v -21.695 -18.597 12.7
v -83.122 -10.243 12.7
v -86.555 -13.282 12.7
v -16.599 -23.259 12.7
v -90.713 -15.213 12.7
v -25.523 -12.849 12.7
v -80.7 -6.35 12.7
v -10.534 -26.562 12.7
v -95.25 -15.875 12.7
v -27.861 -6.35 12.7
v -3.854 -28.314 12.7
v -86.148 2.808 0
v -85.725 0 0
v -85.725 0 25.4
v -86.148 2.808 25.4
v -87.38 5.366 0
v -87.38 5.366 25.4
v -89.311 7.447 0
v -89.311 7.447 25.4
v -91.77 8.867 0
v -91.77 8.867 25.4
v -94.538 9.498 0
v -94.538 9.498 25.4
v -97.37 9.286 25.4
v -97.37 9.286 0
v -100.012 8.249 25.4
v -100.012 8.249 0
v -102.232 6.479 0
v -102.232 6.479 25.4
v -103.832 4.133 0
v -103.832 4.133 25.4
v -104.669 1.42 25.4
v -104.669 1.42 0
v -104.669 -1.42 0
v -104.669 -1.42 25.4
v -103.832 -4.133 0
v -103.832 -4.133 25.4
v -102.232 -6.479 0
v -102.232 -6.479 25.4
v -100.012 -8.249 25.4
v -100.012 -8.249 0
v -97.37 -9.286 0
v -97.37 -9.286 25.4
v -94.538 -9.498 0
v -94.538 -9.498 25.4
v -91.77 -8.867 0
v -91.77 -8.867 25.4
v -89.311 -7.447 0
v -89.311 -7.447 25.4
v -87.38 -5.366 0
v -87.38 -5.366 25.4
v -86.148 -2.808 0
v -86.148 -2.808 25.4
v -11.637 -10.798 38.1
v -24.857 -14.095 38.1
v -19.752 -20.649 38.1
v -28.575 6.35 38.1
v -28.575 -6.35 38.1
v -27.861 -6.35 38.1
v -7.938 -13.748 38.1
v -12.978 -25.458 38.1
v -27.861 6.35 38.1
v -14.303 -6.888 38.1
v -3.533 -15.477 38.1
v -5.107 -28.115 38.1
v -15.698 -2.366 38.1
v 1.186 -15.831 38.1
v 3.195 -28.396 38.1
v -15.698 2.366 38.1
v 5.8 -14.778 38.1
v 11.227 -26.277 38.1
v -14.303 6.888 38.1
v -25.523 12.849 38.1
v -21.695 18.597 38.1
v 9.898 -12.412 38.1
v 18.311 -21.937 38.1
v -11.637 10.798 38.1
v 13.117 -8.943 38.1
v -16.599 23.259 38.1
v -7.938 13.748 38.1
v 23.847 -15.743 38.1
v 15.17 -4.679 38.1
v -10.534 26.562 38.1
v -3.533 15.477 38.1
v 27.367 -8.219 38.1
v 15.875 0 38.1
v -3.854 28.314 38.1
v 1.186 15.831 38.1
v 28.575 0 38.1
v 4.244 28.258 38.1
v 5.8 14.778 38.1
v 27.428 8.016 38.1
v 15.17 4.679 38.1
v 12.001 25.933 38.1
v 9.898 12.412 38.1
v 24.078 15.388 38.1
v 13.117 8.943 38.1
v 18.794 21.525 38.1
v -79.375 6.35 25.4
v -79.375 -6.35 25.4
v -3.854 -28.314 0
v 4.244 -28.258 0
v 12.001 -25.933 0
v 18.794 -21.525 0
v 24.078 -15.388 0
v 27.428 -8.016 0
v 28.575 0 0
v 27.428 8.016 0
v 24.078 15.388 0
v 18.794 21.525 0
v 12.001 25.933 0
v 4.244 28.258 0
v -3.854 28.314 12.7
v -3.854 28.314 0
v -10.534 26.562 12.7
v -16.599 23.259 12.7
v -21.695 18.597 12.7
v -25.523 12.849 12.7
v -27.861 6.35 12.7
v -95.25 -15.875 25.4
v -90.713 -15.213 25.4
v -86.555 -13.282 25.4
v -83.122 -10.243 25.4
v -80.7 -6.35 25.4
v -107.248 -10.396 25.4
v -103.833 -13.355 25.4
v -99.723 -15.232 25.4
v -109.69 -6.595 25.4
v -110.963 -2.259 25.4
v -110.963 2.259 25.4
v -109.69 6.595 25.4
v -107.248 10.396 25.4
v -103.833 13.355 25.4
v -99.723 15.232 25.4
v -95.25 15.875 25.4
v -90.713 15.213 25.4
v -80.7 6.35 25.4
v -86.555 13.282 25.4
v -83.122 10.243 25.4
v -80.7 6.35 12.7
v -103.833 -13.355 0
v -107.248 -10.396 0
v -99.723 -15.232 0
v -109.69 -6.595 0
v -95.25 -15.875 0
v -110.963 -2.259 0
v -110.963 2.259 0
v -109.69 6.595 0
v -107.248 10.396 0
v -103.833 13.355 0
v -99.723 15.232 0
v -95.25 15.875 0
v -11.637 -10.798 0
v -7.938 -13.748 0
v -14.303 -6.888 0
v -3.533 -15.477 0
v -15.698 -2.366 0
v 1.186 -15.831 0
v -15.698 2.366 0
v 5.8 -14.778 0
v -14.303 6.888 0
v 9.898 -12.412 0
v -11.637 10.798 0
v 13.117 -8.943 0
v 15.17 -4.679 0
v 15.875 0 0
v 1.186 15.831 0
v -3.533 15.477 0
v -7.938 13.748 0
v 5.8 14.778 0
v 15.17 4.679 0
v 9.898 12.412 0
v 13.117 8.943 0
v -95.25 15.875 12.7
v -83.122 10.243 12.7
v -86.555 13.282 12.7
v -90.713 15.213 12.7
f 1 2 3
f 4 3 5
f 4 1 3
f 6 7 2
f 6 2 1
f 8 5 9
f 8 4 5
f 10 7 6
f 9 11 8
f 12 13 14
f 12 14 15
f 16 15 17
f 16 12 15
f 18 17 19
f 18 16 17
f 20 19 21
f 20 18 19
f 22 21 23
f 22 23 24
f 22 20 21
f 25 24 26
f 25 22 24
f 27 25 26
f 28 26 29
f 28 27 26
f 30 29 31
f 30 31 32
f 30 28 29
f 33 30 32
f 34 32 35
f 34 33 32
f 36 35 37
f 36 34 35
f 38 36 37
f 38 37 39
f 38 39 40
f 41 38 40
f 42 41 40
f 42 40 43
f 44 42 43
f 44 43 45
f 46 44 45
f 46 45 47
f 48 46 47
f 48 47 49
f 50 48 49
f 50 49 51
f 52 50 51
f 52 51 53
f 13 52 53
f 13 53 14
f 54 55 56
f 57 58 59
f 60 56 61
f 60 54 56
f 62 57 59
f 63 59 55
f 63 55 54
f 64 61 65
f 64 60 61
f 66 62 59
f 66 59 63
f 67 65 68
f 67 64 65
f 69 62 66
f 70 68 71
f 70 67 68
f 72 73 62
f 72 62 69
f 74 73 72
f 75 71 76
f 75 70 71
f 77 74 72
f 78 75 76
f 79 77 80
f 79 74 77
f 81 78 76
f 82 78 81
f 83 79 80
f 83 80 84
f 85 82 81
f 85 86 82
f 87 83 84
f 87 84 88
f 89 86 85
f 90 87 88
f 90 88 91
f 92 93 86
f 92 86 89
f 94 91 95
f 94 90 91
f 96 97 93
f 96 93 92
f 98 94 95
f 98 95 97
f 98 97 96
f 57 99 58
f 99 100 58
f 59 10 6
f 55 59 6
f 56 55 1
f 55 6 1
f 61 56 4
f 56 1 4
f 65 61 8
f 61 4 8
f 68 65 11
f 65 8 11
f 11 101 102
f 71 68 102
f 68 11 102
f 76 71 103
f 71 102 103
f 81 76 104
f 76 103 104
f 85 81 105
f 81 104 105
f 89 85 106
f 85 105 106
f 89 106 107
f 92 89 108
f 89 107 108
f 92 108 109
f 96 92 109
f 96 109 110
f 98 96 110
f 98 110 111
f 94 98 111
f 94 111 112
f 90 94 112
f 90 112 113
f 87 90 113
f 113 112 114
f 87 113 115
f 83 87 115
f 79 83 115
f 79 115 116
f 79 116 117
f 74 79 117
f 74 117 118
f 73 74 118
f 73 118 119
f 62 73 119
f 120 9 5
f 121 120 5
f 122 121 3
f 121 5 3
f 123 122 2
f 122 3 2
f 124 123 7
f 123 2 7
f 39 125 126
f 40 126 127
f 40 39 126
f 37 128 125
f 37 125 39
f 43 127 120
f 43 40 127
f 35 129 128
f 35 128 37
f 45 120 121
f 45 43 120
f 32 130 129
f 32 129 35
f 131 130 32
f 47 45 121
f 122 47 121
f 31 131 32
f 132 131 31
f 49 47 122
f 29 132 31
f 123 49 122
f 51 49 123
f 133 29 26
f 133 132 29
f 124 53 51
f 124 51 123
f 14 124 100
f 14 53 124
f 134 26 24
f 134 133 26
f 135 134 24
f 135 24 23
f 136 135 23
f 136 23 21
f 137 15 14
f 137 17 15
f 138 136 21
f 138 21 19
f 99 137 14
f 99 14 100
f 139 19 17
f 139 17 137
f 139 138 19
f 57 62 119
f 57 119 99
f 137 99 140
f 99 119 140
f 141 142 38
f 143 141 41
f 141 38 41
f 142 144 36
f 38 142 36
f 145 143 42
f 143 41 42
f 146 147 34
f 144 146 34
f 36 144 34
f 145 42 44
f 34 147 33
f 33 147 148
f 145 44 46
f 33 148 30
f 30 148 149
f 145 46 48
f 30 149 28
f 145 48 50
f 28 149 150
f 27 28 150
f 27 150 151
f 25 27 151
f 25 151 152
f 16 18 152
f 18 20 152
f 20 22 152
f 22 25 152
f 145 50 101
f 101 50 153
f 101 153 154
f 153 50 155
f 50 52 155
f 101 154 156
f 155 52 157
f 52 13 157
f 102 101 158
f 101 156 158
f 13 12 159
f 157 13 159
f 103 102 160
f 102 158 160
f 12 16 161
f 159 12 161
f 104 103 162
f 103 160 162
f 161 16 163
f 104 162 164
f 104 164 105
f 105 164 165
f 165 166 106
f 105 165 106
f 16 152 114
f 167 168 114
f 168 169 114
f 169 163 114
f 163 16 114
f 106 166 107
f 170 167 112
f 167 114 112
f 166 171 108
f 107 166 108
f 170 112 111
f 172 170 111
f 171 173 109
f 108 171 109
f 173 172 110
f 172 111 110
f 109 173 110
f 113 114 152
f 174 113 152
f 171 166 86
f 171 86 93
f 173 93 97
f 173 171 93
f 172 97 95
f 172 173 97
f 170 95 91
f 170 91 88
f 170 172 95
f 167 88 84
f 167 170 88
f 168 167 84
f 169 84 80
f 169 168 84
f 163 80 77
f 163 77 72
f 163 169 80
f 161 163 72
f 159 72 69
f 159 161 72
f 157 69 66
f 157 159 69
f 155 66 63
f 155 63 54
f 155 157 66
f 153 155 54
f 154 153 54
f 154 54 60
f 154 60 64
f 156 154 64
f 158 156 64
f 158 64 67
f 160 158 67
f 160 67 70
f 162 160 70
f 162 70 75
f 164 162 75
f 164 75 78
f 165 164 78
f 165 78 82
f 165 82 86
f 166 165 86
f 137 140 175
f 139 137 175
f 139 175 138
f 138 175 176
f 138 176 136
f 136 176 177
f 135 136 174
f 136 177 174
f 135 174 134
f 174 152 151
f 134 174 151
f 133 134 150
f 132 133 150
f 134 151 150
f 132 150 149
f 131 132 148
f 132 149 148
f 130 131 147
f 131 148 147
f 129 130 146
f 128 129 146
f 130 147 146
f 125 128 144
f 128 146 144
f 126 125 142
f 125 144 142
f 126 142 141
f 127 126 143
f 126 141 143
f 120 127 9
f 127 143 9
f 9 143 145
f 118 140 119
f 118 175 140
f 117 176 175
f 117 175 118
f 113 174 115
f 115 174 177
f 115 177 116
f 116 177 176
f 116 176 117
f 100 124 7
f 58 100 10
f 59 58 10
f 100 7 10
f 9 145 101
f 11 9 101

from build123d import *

# Parameters (mm, degrees)
F0_R          = 9.525
F0_R_2        = 15.875
F1_DEPTH      = 12.7
F2_DEPTH      = 38.1
F3_DEPTH      = 25.4
F5_DEPTH      = 38.1
F7_DEPTH      = 6.35
F7_DEPTH_BACK = 6.35


with BuildPart() as f1:
    # F0 (on Top) → F1 (new body)
    with BuildSketch(Plane.XY):
        with BuildLine():
            ThreePointArc((-79.375, 0), (-79.7098622822, 3.2434155936), (-80.7003221685, 6.35))
            ThreePointArc((-80.7003221685, 6.35), (-86.5549043996, 13.2819779212), (-95.25, 15.875))
            ThreePointArc((-95.25, 15.875), (-111.125, 0), (-95.25, -15.875))
            ThreePointArc((-95.25, -15.875), (-86.5549043996, -13.2819779212), (-80.7003221685, -6.35))
            ThreePointArc((-80.7003221685, -6.35), (-79.7098622822, -3.2434155936), (-79.375, 0))
        make_face()
        with Locations((-95.25, 0)):
            Circle(F0_R, mode=Mode.SUBTRACT)
        with BuildLine():
            ThreePointArc((-27.86051193, -6.35), (-28.575, 0), (-27.86051193, 6.35))
            Line((-27.86051193, 6.35), (-80.7003221685, 6.35))
            ThreePointArc((-80.7003221685, 6.35), (-79.7098622822, 3.2434155936), (-79.375, 0))
            ThreePointArc((-79.375, 0), (-79.7098622822, -3.2434155936), (-80.7003221685, -6.35))
            Line((-80.7003221685, -6.35), (-27.86051193, -6.35))
        make_face()
        with BuildLine():
            Line((-80.7003221685, 6.35), (-27.86051193, 6.35))
            ThreePointArc((-27.86051193, 6.35), (-19.2885651774, 21.0827388732), (-3.8535043435, 28.3139740989))
            Line((-3.8535043435, 28.3139740989), (-95.25, 15.875))
            ThreePointArc((-95.25, 15.875), (-86.5549043996, 13.2819779212), (-80.7003221685, 6.35))
        make_face()
        with BuildLine():
            ThreePointArc((-3.8535043435, -28.3139740989), (-19.2885651774, -21.0827388732), (-27.86051193, -6.35))
            Line((-27.86051193, -6.35), (-80.7003221685, -6.35))
            ThreePointArc((-80.7003221685, -6.35), (-86.5549043996, -13.2819779212), (-95.25, -15.875))
            Line((-95.25, -15.875), (-3.8535043435, -28.3139740989))
        make_face()
        with BuildLine():
            ThreePointArc((-3.8535043435, 28.3139740989), (-19.2885651774, 21.0827388732), (-27.86051193, 6.35))
            ThreePointArc((-27.86051193, 6.35), (-28.575, 0), (-27.86051193, -6.35))
            ThreePointArc((-27.86051193, -6.35), (-19.2885651774, -21.0827388732), (-3.8535043435, -28.3139740989))
            ThreePointArc((-3.8535043435, -28.3139740989), (18.7938385965, -21.5249217376), (28.575, 0))
            ThreePointArc((28.575, 0), (18.7938385965, 21.5249217375), (-3.8535043435, 28.3139740989))
        make_face()
        Circle(F0_R_2, mode=Mode.SUBTRACT)
    extrude(amount=F1_DEPTH)

    # F0 (on Top) → F2 (join)
    with BuildSketch(Plane.XY):
        with BuildLine():
            ThreePointArc((-3.8535043435, 28.3139740989), (-19.2885651774, 21.0827388732), (-27.86051193, 6.35))
            ThreePointArc((-27.86051193, 6.35), (-28.575, 0), (-27.86051193, -6.35))
            ThreePointArc((-27.86051193, -6.35), (-19.2885651774, -21.0827388732), (-3.8535043435, -28.3139740989))
            ThreePointArc((-3.8535043435, -28.3139740989), (18.7938385965, -21.5249217376), (28.575, 0))
            ThreePointArc((28.575, 0), (18.7938385965, 21.5249217375), (-3.8535043435, 28.3139740989))
        make_face()
        Circle(F0_R_2, mode=Mode.SUBTRACT)
    extrude(amount=F2_DEPTH)

    # F0 (on Top) → F3 (join)
    with BuildSketch(Plane.XY):
        with BuildLine():
            ThreePointArc((-79.375, 0), (-79.7098622822, 3.2434155936), (-80.7003221685, 6.35))
            ThreePointArc((-80.7003221685, 6.35), (-86.5549043996, 13.2819779212), (-95.25, 15.875))
            ThreePointArc((-95.25, 15.875), (-111.125, 0), (-95.25, -15.875))
            ThreePointArc((-95.25, -15.875), (-86.5549043996, -13.2819779212), (-80.7003221685, -6.35))
            ThreePointArc((-80.7003221685, -6.35), (-79.7098622822, -3.2434155936), (-79.375, 0))
        make_face()
        with Locations((-95.25, 0)):
            Circle(F0_R, mode=Mode.SUBTRACT)
    extrude(amount=F3_DEPTH)

    # F0 (on Top) → F5 (join, through all)
    with BuildSketch(Plane.XY):
        with BuildLine():
            ThreePointArc((-27.86051193, -6.35), (-28.575, 0), (-27.86051193, 6.35))
            Line((-27.86051193, 6.35), (-80.7003221685, 6.35))
            ThreePointArc((-80.7003221685, 6.35), (-79.7098622822, 3.2434155936), (-79.375, 0))
            ThreePointArc((-79.375, 0), (-79.7098622822, -3.2434155936), (-80.7003221685, -6.35))
            Line((-80.7003221685, -6.35), (-27.86051193, -6.35))
        make_face()
    extrude(amount=F5_DEPTH)

    # F6 (on Front) → F7 (cut, two sides)
    with BuildSketch(Plane.XZ) as f7_sk:
        Polygon((-80.7003221685, 25.4), (-79.375, 25.4), (-28.575, 38.1), (-80.7003221685, 38.1), align=None)
    extrude(amount=-F7_DEPTH, mode=Mode.SUBTRACT)
    extrude(f7_sk.sketch, amount=F7_DEPTH_BACK, mode=Mode.SUBTRACT)


solid = f1.part
